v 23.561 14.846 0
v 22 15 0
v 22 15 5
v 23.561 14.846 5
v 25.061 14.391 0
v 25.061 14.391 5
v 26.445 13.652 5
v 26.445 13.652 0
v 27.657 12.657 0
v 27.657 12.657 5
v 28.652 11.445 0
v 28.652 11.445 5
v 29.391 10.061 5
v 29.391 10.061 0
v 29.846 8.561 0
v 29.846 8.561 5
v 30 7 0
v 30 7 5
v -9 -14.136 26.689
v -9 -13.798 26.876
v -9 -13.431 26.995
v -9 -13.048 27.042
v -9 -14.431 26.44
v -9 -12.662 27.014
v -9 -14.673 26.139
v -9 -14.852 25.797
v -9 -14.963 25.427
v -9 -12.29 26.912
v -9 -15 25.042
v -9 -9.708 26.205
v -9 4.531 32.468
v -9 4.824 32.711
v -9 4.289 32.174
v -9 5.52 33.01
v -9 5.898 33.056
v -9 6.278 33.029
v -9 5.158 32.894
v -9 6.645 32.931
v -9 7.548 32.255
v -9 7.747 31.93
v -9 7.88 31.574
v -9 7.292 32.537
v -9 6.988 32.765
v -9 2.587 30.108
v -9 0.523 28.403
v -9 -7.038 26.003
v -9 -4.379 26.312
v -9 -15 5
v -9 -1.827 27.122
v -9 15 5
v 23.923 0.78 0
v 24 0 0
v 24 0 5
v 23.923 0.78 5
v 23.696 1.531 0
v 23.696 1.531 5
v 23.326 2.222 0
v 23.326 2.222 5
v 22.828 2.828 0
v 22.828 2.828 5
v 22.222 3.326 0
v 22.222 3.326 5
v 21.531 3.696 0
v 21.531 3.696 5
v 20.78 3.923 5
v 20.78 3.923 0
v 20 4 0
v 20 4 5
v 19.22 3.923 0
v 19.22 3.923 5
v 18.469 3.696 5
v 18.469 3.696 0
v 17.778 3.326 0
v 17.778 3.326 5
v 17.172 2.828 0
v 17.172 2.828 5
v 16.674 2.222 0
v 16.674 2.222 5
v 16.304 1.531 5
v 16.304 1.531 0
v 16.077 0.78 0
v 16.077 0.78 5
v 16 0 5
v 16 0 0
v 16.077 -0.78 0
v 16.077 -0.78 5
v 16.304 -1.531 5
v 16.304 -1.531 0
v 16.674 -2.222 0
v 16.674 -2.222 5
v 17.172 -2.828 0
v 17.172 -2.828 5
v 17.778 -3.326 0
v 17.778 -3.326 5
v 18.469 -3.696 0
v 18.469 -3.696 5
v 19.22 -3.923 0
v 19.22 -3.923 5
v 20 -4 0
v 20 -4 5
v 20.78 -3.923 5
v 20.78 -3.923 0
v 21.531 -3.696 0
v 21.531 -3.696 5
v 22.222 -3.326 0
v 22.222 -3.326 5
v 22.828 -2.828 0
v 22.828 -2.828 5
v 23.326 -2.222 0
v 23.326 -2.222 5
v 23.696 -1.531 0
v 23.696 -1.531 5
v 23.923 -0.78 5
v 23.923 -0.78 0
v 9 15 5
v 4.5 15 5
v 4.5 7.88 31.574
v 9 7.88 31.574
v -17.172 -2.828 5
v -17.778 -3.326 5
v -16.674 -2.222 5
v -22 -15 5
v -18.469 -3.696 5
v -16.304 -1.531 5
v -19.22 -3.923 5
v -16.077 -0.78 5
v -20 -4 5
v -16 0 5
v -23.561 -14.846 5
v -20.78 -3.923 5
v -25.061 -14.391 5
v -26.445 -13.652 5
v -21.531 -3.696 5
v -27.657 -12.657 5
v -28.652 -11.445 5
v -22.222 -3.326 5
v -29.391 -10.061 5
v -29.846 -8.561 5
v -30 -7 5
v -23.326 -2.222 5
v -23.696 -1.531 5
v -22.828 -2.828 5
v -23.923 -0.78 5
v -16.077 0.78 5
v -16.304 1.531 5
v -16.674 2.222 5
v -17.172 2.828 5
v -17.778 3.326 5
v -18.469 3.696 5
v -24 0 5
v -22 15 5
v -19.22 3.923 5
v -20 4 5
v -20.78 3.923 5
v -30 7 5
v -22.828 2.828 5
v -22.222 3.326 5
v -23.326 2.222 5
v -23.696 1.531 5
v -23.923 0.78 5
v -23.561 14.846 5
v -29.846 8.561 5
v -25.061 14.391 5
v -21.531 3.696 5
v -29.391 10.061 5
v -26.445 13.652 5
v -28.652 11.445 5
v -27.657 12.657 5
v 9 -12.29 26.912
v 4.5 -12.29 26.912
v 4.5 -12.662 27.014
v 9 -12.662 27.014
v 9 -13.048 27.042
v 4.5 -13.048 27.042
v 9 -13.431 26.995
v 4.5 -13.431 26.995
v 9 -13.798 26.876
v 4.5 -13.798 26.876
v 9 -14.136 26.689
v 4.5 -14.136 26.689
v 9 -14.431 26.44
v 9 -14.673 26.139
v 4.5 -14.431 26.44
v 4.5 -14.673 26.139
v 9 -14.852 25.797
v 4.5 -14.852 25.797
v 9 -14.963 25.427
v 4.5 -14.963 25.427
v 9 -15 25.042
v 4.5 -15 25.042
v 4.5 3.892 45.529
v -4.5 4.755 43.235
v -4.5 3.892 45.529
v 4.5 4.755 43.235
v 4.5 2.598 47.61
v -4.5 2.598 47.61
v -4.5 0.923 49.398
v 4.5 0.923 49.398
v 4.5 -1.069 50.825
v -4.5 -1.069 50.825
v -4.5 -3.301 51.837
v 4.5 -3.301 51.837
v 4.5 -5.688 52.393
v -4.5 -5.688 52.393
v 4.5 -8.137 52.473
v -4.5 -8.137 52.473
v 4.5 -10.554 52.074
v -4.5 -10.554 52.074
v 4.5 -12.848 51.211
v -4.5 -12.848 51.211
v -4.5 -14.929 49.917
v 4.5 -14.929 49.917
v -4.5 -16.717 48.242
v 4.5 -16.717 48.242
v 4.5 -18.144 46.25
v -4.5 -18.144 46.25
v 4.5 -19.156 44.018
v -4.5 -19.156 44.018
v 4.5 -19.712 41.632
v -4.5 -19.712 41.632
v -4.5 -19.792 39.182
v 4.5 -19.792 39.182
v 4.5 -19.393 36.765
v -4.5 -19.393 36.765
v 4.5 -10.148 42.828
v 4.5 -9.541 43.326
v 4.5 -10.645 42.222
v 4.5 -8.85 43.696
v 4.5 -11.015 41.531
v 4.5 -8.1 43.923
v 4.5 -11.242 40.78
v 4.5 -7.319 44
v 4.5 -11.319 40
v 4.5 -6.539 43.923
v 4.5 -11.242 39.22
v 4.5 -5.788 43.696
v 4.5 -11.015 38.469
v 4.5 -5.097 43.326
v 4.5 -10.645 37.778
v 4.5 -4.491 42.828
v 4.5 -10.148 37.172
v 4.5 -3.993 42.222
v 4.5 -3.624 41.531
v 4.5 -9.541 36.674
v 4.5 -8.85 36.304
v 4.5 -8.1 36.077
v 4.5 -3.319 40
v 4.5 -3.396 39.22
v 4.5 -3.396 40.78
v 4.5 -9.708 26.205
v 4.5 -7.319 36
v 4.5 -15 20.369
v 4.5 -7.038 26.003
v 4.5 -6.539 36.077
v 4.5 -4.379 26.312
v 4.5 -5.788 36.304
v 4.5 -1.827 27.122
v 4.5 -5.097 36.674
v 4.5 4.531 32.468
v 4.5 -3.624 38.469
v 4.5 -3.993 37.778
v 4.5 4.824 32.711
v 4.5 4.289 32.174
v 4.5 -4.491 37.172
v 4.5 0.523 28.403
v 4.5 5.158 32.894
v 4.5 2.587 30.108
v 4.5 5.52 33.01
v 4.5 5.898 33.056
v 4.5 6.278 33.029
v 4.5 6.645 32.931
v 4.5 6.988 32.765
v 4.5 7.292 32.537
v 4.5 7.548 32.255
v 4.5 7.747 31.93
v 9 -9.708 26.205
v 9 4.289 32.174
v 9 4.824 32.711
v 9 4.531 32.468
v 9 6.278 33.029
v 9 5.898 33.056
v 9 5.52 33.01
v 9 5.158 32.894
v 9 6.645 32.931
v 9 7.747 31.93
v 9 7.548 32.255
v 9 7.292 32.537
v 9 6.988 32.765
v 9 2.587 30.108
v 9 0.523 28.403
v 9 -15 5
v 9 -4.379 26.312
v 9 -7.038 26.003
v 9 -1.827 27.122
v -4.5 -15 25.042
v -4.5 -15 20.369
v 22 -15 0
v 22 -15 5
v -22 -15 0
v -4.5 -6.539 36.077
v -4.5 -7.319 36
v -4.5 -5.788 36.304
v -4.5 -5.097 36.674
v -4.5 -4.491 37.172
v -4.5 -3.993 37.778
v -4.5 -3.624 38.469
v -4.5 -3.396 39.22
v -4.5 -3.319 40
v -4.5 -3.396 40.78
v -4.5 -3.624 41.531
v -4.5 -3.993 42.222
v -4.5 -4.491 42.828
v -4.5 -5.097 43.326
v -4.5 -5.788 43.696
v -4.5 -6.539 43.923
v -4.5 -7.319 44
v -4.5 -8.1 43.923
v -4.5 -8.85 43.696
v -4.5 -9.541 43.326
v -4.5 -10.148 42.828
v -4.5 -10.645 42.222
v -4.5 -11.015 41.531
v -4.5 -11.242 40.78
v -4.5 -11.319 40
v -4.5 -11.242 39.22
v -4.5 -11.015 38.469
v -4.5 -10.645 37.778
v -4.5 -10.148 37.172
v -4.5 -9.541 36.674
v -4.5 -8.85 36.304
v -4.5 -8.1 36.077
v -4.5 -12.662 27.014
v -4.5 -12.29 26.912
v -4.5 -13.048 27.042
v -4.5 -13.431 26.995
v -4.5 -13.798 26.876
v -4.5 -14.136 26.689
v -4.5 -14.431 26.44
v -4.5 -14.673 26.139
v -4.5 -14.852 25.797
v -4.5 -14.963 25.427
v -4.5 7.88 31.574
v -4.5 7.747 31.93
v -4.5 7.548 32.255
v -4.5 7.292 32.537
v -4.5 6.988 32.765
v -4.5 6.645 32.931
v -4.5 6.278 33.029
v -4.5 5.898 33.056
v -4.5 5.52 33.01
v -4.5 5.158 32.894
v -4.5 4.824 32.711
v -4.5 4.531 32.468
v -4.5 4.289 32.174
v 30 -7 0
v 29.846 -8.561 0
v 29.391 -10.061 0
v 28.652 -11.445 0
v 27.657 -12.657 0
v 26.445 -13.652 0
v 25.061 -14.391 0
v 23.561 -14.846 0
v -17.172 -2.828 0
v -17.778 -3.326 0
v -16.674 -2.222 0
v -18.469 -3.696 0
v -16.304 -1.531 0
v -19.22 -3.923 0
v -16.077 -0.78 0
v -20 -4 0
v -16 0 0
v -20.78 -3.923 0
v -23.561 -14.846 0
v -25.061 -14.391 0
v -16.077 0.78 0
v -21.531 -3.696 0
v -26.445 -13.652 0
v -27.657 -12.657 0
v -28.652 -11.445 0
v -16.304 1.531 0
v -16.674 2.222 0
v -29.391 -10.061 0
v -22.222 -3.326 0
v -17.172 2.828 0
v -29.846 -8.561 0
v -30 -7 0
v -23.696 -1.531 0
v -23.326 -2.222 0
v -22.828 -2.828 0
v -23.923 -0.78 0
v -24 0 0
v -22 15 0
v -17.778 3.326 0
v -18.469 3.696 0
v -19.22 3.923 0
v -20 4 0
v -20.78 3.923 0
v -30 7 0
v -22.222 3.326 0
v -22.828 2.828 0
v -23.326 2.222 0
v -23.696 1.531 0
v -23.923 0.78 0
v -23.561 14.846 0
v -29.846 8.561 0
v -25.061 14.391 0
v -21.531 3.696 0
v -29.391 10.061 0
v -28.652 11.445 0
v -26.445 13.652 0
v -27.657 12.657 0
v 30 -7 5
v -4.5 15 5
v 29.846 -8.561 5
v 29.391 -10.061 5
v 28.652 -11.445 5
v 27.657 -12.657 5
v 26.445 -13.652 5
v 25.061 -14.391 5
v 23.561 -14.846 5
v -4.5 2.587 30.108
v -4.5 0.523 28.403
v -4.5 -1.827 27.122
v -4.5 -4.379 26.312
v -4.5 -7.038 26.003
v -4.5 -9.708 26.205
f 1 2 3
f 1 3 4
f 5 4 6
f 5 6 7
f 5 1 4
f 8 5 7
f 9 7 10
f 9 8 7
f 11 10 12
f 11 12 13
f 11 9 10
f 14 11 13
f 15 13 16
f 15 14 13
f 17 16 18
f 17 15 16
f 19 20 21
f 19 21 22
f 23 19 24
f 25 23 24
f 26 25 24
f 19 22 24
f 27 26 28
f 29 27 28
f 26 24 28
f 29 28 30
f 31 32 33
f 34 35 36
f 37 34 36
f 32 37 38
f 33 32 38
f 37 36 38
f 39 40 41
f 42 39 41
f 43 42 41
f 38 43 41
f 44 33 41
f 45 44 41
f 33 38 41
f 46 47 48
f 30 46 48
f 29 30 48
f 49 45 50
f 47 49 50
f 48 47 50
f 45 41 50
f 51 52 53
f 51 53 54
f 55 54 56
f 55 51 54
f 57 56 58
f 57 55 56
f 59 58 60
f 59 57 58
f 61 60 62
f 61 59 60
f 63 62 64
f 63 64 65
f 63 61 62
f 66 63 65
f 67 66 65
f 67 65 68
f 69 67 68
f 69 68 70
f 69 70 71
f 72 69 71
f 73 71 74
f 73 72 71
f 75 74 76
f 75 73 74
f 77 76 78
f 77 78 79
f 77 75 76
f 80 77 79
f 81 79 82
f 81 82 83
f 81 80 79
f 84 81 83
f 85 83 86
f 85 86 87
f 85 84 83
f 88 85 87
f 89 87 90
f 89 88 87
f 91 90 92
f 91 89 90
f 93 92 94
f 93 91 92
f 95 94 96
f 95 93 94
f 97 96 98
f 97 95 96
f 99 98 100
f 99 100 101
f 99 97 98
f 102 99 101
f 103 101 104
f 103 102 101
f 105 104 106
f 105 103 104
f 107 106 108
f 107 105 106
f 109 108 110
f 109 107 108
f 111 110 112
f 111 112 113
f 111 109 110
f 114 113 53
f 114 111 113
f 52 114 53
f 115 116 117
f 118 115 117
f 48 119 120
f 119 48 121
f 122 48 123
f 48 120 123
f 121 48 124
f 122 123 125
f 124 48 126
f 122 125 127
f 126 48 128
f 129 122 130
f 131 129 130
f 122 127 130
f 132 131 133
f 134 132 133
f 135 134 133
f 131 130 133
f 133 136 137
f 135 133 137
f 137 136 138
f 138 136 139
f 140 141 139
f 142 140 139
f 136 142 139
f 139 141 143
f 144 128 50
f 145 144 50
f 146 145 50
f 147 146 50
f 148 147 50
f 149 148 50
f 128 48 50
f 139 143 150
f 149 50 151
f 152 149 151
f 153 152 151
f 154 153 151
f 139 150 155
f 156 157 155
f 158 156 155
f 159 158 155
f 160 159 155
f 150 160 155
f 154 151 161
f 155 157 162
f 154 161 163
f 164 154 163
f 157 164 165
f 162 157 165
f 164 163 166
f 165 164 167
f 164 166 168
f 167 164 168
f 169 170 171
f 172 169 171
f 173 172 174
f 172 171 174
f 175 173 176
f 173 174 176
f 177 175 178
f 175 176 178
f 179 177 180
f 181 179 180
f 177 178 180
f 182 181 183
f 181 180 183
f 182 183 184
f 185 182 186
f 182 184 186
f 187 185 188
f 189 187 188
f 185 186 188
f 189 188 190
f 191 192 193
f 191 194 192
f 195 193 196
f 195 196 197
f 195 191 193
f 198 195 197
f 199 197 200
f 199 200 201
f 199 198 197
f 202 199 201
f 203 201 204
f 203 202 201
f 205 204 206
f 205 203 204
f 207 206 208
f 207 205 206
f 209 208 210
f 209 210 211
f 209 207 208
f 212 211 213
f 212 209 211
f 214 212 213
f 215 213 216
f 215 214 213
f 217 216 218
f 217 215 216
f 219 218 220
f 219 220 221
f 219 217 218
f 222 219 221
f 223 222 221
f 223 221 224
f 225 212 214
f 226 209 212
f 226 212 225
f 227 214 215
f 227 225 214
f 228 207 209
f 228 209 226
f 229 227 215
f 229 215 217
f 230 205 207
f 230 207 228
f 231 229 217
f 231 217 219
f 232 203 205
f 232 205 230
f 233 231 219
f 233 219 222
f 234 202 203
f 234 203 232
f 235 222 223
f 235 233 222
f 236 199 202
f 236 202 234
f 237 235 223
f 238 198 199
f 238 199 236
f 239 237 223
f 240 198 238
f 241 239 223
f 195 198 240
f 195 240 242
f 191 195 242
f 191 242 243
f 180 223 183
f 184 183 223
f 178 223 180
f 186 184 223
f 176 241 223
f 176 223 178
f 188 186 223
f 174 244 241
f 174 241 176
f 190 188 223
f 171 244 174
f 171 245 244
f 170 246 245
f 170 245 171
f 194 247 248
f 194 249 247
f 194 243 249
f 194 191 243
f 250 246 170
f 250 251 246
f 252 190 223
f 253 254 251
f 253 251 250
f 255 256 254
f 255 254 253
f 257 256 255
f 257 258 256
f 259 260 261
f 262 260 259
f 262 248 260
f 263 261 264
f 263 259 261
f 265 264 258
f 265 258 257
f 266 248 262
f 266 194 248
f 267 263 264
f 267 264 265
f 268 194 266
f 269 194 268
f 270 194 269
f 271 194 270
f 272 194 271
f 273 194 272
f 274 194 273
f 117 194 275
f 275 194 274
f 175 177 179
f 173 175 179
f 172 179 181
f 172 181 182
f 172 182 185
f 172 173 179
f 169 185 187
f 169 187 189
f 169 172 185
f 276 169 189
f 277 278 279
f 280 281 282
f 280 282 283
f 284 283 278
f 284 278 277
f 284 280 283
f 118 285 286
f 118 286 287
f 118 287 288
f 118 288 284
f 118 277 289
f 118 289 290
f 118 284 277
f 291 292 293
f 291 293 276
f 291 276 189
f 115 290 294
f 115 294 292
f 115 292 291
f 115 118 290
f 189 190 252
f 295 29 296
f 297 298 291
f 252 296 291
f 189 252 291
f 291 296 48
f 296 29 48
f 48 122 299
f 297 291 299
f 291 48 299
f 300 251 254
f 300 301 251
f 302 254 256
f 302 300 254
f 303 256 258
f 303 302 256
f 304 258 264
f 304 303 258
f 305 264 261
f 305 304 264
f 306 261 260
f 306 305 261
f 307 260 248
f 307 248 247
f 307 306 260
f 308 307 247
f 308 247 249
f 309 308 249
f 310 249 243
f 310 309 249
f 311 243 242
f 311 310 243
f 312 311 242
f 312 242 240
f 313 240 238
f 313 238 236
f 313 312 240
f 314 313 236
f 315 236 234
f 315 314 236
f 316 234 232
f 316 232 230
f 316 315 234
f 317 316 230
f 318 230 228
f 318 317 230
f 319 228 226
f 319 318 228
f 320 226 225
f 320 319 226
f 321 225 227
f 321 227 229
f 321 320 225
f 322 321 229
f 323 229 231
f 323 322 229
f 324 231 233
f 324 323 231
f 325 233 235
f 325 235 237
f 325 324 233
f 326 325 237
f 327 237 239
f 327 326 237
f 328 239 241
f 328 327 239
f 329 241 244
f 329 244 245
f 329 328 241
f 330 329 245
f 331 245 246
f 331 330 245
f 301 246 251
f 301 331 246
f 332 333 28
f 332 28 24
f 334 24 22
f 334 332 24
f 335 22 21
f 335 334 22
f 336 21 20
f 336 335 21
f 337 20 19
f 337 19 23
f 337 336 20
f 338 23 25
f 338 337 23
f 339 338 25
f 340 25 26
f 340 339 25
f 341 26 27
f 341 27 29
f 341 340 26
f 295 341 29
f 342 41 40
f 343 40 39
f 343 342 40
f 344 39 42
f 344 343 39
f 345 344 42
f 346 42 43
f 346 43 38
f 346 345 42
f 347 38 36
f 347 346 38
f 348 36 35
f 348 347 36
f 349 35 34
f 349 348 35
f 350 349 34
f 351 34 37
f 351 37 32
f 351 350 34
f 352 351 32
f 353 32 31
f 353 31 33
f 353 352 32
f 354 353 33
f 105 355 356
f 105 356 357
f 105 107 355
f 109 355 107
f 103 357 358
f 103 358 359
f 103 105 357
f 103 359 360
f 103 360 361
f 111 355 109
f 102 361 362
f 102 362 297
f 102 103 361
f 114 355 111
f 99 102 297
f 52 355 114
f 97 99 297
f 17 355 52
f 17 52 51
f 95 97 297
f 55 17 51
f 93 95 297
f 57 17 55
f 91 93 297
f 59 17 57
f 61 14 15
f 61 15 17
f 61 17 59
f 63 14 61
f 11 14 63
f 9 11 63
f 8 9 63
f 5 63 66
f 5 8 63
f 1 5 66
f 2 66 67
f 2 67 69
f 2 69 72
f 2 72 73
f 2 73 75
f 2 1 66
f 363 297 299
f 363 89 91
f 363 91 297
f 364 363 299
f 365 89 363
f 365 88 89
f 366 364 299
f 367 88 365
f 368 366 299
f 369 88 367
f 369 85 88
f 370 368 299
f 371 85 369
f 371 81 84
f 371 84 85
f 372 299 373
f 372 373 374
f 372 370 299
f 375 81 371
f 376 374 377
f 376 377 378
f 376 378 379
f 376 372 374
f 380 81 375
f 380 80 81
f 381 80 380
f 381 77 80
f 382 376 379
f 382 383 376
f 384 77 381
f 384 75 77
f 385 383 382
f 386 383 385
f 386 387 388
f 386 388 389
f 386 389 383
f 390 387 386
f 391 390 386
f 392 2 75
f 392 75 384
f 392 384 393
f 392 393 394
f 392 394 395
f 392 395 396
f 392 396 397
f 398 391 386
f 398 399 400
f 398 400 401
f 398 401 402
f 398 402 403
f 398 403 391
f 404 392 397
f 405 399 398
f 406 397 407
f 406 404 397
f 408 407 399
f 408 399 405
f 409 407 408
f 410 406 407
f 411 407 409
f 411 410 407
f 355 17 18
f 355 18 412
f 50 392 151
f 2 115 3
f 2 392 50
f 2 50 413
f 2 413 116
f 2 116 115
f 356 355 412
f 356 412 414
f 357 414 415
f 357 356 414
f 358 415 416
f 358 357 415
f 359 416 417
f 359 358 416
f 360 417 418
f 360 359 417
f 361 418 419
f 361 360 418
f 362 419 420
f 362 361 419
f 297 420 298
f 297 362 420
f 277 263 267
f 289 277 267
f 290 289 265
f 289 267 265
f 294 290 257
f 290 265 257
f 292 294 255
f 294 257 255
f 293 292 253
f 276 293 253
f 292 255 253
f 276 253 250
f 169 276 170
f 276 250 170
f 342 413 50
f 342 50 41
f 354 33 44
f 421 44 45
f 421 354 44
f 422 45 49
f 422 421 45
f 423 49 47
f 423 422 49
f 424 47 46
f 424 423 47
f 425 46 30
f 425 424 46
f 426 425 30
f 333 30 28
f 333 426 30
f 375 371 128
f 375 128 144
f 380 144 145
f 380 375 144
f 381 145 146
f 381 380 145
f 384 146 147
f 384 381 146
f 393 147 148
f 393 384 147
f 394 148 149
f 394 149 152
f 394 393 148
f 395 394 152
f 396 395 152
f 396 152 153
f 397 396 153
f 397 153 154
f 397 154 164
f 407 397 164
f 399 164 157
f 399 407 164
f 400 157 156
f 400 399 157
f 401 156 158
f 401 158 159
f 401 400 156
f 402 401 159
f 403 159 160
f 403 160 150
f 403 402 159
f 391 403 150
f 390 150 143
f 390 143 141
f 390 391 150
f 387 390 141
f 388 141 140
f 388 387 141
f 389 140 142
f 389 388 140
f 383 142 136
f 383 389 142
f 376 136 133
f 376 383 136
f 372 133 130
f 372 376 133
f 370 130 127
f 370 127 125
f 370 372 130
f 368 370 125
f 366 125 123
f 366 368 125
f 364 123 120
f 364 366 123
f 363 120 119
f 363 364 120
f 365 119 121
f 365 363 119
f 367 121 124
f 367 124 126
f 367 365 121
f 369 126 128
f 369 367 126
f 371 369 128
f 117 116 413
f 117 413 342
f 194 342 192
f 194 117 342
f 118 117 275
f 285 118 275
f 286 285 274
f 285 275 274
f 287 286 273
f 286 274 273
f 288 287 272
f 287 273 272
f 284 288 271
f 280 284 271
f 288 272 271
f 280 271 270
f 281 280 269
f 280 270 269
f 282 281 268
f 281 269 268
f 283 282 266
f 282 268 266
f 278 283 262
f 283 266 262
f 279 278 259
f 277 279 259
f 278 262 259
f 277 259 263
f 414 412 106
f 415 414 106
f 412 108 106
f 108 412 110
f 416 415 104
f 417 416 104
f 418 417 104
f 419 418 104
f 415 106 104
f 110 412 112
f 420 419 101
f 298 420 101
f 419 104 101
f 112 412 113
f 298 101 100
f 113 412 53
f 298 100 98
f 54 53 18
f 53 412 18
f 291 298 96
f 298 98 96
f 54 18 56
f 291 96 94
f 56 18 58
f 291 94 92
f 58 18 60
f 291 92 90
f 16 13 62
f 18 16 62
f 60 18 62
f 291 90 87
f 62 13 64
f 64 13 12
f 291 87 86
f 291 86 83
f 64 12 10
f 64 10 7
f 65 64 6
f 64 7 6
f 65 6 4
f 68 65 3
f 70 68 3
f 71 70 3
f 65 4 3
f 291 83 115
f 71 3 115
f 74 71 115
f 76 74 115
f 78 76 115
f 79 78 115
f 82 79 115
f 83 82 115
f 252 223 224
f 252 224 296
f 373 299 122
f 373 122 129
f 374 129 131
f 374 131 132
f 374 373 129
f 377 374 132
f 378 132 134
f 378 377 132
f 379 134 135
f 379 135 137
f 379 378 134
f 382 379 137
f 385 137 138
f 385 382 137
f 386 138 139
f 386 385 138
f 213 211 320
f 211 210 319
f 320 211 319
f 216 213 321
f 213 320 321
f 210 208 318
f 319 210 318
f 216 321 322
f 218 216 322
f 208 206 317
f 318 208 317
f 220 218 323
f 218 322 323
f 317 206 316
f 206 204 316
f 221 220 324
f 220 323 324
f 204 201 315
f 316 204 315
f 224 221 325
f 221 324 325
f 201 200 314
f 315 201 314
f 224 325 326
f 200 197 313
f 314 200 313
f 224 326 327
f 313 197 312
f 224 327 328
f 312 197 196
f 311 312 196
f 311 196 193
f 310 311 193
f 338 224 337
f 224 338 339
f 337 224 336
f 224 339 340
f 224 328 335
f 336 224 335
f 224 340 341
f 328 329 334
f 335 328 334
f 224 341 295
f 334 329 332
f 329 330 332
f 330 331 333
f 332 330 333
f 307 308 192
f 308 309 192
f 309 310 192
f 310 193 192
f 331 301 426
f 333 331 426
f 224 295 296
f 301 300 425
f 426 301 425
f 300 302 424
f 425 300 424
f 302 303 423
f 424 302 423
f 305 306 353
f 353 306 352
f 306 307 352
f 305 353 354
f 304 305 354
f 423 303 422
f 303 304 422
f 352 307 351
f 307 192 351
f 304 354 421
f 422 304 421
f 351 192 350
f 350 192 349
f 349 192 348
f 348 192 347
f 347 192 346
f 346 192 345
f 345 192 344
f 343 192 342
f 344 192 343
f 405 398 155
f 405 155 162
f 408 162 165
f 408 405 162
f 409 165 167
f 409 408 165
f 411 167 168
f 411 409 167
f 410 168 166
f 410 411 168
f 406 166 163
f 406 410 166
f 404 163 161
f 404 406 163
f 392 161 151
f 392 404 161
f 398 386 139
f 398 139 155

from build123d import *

# Parameters (mm, degrees)
SKETCH2_R                = 4
BOSS_EXTRUDE1_DEPTH      = 5
SKETCH3_R                = 4
BOSS_EXTRUDE2_DEPTH      = 4.5
BOSS_EXTRUDE2_DEPTH_BACK = 4.5
BOSS_EXTRUDE3_DEPTH      = 4.5
BOSS_EXTRUDE3_DEPTH_BACK = 13.5


with BuildPart() as part:
    # Sketch2 → Boss-Extrude1 (new body)
    with BuildSketch(Plane.XY):
        with BuildLine():
            Line((-22, 15), (22, 15))
            ThreePointArc((22, 15), (27.656854249, 12.656854249), (30, 7))
            Line((30, 7), (30, -7))
            ThreePointArc((30, -7), (27.656854249, -12.656854249), (22, -15))
            Line((22, -15), (-22, -15))
            ThreePointArc((-22, -15), (-27.656854249, -12.656854249), (-30, -7))
            Line((-30, -7), (-30, 7))
            ThreePointArc((-30, 7), (-27.656854249, 12.656854249), (-22, 15))
        make_face()
        with Locations((-20, 0)):
            Circle(SKETCH2_R, mode=Mode.SUBTRACT)
        with Locations((20, 0)):
            Circle(SKETCH2_R, mode=Mode.SUBTRACT)
    extrude(amount=BOSS_EXTRUDE1_DEPTH)

    # Sketch3 → Boss-Extrude2 (add, two sides)
    with BuildSketch(Plane(origin=(0, 0, 0), x_dir=(0, 0, -1), z_dir=(1, 0, 0))) as boss_extrude2_sk:
        with BuildLine():
            Line((-36.764761936, -19.393246819), (-5, -10.88190451))
            Line((-5, -10.88190451), (-5, 15))
            Line((-5, 15), (-43.235238064, 4.754898838))
            ThreePointArc((-43.235238064, 4.754898838), (-52.074072829, -10.554412054), (-36.764761936, -19.393246819))
        make_face()
        with Locations((-40, -7.31917399)):
            Circle(SKETCH3_R, mode=Mode.SUBTRACT)
    extrude(amount=BOSS_EXTRUDE2_DEPTH)
    extrude(boss_extrude2_sk.sketch, amount=-BOSS_EXTRUDE2_DEPTH_BACK)

    # Sketch4 → Boss-Extrude3 (add, two sides)
    with BuildSketch(Plane(origin=(4.5, 0, 0), x_dir=(0, 0, -1), z_dir=(1, 0, 0))) as boss_extrude3_sk:
        with BuildLine():
            Line((-25.04245288, -15), (-5, -15))
            Line((-5, -15), (-5, 15))
            Line((-5, 15), (-31.573908753, 7.87954261))
            ThreePointArc((-31.573908753, 7.87954261), (-33.028883618, 6.27753657), (-32.17423683, 4.289332839))
            ThreePointArc((-32.17423683, 4.289332839), (-26.655991742, -3.083912061), (-26.91214627, -12.289896749))
            ThreePointArc((-26.91214627, -12.289896749), (-26.688692003, -14.135736214), (-25.04245288, -15))
        make_face()
    extrude(amount=BOSS_EXTRUDE3_DEPTH)
    extrude(boss_extrude3_sk.sketch, amount=-BOSS_EXTRUDE3_DEPTH_BACK)


solid = part.part
